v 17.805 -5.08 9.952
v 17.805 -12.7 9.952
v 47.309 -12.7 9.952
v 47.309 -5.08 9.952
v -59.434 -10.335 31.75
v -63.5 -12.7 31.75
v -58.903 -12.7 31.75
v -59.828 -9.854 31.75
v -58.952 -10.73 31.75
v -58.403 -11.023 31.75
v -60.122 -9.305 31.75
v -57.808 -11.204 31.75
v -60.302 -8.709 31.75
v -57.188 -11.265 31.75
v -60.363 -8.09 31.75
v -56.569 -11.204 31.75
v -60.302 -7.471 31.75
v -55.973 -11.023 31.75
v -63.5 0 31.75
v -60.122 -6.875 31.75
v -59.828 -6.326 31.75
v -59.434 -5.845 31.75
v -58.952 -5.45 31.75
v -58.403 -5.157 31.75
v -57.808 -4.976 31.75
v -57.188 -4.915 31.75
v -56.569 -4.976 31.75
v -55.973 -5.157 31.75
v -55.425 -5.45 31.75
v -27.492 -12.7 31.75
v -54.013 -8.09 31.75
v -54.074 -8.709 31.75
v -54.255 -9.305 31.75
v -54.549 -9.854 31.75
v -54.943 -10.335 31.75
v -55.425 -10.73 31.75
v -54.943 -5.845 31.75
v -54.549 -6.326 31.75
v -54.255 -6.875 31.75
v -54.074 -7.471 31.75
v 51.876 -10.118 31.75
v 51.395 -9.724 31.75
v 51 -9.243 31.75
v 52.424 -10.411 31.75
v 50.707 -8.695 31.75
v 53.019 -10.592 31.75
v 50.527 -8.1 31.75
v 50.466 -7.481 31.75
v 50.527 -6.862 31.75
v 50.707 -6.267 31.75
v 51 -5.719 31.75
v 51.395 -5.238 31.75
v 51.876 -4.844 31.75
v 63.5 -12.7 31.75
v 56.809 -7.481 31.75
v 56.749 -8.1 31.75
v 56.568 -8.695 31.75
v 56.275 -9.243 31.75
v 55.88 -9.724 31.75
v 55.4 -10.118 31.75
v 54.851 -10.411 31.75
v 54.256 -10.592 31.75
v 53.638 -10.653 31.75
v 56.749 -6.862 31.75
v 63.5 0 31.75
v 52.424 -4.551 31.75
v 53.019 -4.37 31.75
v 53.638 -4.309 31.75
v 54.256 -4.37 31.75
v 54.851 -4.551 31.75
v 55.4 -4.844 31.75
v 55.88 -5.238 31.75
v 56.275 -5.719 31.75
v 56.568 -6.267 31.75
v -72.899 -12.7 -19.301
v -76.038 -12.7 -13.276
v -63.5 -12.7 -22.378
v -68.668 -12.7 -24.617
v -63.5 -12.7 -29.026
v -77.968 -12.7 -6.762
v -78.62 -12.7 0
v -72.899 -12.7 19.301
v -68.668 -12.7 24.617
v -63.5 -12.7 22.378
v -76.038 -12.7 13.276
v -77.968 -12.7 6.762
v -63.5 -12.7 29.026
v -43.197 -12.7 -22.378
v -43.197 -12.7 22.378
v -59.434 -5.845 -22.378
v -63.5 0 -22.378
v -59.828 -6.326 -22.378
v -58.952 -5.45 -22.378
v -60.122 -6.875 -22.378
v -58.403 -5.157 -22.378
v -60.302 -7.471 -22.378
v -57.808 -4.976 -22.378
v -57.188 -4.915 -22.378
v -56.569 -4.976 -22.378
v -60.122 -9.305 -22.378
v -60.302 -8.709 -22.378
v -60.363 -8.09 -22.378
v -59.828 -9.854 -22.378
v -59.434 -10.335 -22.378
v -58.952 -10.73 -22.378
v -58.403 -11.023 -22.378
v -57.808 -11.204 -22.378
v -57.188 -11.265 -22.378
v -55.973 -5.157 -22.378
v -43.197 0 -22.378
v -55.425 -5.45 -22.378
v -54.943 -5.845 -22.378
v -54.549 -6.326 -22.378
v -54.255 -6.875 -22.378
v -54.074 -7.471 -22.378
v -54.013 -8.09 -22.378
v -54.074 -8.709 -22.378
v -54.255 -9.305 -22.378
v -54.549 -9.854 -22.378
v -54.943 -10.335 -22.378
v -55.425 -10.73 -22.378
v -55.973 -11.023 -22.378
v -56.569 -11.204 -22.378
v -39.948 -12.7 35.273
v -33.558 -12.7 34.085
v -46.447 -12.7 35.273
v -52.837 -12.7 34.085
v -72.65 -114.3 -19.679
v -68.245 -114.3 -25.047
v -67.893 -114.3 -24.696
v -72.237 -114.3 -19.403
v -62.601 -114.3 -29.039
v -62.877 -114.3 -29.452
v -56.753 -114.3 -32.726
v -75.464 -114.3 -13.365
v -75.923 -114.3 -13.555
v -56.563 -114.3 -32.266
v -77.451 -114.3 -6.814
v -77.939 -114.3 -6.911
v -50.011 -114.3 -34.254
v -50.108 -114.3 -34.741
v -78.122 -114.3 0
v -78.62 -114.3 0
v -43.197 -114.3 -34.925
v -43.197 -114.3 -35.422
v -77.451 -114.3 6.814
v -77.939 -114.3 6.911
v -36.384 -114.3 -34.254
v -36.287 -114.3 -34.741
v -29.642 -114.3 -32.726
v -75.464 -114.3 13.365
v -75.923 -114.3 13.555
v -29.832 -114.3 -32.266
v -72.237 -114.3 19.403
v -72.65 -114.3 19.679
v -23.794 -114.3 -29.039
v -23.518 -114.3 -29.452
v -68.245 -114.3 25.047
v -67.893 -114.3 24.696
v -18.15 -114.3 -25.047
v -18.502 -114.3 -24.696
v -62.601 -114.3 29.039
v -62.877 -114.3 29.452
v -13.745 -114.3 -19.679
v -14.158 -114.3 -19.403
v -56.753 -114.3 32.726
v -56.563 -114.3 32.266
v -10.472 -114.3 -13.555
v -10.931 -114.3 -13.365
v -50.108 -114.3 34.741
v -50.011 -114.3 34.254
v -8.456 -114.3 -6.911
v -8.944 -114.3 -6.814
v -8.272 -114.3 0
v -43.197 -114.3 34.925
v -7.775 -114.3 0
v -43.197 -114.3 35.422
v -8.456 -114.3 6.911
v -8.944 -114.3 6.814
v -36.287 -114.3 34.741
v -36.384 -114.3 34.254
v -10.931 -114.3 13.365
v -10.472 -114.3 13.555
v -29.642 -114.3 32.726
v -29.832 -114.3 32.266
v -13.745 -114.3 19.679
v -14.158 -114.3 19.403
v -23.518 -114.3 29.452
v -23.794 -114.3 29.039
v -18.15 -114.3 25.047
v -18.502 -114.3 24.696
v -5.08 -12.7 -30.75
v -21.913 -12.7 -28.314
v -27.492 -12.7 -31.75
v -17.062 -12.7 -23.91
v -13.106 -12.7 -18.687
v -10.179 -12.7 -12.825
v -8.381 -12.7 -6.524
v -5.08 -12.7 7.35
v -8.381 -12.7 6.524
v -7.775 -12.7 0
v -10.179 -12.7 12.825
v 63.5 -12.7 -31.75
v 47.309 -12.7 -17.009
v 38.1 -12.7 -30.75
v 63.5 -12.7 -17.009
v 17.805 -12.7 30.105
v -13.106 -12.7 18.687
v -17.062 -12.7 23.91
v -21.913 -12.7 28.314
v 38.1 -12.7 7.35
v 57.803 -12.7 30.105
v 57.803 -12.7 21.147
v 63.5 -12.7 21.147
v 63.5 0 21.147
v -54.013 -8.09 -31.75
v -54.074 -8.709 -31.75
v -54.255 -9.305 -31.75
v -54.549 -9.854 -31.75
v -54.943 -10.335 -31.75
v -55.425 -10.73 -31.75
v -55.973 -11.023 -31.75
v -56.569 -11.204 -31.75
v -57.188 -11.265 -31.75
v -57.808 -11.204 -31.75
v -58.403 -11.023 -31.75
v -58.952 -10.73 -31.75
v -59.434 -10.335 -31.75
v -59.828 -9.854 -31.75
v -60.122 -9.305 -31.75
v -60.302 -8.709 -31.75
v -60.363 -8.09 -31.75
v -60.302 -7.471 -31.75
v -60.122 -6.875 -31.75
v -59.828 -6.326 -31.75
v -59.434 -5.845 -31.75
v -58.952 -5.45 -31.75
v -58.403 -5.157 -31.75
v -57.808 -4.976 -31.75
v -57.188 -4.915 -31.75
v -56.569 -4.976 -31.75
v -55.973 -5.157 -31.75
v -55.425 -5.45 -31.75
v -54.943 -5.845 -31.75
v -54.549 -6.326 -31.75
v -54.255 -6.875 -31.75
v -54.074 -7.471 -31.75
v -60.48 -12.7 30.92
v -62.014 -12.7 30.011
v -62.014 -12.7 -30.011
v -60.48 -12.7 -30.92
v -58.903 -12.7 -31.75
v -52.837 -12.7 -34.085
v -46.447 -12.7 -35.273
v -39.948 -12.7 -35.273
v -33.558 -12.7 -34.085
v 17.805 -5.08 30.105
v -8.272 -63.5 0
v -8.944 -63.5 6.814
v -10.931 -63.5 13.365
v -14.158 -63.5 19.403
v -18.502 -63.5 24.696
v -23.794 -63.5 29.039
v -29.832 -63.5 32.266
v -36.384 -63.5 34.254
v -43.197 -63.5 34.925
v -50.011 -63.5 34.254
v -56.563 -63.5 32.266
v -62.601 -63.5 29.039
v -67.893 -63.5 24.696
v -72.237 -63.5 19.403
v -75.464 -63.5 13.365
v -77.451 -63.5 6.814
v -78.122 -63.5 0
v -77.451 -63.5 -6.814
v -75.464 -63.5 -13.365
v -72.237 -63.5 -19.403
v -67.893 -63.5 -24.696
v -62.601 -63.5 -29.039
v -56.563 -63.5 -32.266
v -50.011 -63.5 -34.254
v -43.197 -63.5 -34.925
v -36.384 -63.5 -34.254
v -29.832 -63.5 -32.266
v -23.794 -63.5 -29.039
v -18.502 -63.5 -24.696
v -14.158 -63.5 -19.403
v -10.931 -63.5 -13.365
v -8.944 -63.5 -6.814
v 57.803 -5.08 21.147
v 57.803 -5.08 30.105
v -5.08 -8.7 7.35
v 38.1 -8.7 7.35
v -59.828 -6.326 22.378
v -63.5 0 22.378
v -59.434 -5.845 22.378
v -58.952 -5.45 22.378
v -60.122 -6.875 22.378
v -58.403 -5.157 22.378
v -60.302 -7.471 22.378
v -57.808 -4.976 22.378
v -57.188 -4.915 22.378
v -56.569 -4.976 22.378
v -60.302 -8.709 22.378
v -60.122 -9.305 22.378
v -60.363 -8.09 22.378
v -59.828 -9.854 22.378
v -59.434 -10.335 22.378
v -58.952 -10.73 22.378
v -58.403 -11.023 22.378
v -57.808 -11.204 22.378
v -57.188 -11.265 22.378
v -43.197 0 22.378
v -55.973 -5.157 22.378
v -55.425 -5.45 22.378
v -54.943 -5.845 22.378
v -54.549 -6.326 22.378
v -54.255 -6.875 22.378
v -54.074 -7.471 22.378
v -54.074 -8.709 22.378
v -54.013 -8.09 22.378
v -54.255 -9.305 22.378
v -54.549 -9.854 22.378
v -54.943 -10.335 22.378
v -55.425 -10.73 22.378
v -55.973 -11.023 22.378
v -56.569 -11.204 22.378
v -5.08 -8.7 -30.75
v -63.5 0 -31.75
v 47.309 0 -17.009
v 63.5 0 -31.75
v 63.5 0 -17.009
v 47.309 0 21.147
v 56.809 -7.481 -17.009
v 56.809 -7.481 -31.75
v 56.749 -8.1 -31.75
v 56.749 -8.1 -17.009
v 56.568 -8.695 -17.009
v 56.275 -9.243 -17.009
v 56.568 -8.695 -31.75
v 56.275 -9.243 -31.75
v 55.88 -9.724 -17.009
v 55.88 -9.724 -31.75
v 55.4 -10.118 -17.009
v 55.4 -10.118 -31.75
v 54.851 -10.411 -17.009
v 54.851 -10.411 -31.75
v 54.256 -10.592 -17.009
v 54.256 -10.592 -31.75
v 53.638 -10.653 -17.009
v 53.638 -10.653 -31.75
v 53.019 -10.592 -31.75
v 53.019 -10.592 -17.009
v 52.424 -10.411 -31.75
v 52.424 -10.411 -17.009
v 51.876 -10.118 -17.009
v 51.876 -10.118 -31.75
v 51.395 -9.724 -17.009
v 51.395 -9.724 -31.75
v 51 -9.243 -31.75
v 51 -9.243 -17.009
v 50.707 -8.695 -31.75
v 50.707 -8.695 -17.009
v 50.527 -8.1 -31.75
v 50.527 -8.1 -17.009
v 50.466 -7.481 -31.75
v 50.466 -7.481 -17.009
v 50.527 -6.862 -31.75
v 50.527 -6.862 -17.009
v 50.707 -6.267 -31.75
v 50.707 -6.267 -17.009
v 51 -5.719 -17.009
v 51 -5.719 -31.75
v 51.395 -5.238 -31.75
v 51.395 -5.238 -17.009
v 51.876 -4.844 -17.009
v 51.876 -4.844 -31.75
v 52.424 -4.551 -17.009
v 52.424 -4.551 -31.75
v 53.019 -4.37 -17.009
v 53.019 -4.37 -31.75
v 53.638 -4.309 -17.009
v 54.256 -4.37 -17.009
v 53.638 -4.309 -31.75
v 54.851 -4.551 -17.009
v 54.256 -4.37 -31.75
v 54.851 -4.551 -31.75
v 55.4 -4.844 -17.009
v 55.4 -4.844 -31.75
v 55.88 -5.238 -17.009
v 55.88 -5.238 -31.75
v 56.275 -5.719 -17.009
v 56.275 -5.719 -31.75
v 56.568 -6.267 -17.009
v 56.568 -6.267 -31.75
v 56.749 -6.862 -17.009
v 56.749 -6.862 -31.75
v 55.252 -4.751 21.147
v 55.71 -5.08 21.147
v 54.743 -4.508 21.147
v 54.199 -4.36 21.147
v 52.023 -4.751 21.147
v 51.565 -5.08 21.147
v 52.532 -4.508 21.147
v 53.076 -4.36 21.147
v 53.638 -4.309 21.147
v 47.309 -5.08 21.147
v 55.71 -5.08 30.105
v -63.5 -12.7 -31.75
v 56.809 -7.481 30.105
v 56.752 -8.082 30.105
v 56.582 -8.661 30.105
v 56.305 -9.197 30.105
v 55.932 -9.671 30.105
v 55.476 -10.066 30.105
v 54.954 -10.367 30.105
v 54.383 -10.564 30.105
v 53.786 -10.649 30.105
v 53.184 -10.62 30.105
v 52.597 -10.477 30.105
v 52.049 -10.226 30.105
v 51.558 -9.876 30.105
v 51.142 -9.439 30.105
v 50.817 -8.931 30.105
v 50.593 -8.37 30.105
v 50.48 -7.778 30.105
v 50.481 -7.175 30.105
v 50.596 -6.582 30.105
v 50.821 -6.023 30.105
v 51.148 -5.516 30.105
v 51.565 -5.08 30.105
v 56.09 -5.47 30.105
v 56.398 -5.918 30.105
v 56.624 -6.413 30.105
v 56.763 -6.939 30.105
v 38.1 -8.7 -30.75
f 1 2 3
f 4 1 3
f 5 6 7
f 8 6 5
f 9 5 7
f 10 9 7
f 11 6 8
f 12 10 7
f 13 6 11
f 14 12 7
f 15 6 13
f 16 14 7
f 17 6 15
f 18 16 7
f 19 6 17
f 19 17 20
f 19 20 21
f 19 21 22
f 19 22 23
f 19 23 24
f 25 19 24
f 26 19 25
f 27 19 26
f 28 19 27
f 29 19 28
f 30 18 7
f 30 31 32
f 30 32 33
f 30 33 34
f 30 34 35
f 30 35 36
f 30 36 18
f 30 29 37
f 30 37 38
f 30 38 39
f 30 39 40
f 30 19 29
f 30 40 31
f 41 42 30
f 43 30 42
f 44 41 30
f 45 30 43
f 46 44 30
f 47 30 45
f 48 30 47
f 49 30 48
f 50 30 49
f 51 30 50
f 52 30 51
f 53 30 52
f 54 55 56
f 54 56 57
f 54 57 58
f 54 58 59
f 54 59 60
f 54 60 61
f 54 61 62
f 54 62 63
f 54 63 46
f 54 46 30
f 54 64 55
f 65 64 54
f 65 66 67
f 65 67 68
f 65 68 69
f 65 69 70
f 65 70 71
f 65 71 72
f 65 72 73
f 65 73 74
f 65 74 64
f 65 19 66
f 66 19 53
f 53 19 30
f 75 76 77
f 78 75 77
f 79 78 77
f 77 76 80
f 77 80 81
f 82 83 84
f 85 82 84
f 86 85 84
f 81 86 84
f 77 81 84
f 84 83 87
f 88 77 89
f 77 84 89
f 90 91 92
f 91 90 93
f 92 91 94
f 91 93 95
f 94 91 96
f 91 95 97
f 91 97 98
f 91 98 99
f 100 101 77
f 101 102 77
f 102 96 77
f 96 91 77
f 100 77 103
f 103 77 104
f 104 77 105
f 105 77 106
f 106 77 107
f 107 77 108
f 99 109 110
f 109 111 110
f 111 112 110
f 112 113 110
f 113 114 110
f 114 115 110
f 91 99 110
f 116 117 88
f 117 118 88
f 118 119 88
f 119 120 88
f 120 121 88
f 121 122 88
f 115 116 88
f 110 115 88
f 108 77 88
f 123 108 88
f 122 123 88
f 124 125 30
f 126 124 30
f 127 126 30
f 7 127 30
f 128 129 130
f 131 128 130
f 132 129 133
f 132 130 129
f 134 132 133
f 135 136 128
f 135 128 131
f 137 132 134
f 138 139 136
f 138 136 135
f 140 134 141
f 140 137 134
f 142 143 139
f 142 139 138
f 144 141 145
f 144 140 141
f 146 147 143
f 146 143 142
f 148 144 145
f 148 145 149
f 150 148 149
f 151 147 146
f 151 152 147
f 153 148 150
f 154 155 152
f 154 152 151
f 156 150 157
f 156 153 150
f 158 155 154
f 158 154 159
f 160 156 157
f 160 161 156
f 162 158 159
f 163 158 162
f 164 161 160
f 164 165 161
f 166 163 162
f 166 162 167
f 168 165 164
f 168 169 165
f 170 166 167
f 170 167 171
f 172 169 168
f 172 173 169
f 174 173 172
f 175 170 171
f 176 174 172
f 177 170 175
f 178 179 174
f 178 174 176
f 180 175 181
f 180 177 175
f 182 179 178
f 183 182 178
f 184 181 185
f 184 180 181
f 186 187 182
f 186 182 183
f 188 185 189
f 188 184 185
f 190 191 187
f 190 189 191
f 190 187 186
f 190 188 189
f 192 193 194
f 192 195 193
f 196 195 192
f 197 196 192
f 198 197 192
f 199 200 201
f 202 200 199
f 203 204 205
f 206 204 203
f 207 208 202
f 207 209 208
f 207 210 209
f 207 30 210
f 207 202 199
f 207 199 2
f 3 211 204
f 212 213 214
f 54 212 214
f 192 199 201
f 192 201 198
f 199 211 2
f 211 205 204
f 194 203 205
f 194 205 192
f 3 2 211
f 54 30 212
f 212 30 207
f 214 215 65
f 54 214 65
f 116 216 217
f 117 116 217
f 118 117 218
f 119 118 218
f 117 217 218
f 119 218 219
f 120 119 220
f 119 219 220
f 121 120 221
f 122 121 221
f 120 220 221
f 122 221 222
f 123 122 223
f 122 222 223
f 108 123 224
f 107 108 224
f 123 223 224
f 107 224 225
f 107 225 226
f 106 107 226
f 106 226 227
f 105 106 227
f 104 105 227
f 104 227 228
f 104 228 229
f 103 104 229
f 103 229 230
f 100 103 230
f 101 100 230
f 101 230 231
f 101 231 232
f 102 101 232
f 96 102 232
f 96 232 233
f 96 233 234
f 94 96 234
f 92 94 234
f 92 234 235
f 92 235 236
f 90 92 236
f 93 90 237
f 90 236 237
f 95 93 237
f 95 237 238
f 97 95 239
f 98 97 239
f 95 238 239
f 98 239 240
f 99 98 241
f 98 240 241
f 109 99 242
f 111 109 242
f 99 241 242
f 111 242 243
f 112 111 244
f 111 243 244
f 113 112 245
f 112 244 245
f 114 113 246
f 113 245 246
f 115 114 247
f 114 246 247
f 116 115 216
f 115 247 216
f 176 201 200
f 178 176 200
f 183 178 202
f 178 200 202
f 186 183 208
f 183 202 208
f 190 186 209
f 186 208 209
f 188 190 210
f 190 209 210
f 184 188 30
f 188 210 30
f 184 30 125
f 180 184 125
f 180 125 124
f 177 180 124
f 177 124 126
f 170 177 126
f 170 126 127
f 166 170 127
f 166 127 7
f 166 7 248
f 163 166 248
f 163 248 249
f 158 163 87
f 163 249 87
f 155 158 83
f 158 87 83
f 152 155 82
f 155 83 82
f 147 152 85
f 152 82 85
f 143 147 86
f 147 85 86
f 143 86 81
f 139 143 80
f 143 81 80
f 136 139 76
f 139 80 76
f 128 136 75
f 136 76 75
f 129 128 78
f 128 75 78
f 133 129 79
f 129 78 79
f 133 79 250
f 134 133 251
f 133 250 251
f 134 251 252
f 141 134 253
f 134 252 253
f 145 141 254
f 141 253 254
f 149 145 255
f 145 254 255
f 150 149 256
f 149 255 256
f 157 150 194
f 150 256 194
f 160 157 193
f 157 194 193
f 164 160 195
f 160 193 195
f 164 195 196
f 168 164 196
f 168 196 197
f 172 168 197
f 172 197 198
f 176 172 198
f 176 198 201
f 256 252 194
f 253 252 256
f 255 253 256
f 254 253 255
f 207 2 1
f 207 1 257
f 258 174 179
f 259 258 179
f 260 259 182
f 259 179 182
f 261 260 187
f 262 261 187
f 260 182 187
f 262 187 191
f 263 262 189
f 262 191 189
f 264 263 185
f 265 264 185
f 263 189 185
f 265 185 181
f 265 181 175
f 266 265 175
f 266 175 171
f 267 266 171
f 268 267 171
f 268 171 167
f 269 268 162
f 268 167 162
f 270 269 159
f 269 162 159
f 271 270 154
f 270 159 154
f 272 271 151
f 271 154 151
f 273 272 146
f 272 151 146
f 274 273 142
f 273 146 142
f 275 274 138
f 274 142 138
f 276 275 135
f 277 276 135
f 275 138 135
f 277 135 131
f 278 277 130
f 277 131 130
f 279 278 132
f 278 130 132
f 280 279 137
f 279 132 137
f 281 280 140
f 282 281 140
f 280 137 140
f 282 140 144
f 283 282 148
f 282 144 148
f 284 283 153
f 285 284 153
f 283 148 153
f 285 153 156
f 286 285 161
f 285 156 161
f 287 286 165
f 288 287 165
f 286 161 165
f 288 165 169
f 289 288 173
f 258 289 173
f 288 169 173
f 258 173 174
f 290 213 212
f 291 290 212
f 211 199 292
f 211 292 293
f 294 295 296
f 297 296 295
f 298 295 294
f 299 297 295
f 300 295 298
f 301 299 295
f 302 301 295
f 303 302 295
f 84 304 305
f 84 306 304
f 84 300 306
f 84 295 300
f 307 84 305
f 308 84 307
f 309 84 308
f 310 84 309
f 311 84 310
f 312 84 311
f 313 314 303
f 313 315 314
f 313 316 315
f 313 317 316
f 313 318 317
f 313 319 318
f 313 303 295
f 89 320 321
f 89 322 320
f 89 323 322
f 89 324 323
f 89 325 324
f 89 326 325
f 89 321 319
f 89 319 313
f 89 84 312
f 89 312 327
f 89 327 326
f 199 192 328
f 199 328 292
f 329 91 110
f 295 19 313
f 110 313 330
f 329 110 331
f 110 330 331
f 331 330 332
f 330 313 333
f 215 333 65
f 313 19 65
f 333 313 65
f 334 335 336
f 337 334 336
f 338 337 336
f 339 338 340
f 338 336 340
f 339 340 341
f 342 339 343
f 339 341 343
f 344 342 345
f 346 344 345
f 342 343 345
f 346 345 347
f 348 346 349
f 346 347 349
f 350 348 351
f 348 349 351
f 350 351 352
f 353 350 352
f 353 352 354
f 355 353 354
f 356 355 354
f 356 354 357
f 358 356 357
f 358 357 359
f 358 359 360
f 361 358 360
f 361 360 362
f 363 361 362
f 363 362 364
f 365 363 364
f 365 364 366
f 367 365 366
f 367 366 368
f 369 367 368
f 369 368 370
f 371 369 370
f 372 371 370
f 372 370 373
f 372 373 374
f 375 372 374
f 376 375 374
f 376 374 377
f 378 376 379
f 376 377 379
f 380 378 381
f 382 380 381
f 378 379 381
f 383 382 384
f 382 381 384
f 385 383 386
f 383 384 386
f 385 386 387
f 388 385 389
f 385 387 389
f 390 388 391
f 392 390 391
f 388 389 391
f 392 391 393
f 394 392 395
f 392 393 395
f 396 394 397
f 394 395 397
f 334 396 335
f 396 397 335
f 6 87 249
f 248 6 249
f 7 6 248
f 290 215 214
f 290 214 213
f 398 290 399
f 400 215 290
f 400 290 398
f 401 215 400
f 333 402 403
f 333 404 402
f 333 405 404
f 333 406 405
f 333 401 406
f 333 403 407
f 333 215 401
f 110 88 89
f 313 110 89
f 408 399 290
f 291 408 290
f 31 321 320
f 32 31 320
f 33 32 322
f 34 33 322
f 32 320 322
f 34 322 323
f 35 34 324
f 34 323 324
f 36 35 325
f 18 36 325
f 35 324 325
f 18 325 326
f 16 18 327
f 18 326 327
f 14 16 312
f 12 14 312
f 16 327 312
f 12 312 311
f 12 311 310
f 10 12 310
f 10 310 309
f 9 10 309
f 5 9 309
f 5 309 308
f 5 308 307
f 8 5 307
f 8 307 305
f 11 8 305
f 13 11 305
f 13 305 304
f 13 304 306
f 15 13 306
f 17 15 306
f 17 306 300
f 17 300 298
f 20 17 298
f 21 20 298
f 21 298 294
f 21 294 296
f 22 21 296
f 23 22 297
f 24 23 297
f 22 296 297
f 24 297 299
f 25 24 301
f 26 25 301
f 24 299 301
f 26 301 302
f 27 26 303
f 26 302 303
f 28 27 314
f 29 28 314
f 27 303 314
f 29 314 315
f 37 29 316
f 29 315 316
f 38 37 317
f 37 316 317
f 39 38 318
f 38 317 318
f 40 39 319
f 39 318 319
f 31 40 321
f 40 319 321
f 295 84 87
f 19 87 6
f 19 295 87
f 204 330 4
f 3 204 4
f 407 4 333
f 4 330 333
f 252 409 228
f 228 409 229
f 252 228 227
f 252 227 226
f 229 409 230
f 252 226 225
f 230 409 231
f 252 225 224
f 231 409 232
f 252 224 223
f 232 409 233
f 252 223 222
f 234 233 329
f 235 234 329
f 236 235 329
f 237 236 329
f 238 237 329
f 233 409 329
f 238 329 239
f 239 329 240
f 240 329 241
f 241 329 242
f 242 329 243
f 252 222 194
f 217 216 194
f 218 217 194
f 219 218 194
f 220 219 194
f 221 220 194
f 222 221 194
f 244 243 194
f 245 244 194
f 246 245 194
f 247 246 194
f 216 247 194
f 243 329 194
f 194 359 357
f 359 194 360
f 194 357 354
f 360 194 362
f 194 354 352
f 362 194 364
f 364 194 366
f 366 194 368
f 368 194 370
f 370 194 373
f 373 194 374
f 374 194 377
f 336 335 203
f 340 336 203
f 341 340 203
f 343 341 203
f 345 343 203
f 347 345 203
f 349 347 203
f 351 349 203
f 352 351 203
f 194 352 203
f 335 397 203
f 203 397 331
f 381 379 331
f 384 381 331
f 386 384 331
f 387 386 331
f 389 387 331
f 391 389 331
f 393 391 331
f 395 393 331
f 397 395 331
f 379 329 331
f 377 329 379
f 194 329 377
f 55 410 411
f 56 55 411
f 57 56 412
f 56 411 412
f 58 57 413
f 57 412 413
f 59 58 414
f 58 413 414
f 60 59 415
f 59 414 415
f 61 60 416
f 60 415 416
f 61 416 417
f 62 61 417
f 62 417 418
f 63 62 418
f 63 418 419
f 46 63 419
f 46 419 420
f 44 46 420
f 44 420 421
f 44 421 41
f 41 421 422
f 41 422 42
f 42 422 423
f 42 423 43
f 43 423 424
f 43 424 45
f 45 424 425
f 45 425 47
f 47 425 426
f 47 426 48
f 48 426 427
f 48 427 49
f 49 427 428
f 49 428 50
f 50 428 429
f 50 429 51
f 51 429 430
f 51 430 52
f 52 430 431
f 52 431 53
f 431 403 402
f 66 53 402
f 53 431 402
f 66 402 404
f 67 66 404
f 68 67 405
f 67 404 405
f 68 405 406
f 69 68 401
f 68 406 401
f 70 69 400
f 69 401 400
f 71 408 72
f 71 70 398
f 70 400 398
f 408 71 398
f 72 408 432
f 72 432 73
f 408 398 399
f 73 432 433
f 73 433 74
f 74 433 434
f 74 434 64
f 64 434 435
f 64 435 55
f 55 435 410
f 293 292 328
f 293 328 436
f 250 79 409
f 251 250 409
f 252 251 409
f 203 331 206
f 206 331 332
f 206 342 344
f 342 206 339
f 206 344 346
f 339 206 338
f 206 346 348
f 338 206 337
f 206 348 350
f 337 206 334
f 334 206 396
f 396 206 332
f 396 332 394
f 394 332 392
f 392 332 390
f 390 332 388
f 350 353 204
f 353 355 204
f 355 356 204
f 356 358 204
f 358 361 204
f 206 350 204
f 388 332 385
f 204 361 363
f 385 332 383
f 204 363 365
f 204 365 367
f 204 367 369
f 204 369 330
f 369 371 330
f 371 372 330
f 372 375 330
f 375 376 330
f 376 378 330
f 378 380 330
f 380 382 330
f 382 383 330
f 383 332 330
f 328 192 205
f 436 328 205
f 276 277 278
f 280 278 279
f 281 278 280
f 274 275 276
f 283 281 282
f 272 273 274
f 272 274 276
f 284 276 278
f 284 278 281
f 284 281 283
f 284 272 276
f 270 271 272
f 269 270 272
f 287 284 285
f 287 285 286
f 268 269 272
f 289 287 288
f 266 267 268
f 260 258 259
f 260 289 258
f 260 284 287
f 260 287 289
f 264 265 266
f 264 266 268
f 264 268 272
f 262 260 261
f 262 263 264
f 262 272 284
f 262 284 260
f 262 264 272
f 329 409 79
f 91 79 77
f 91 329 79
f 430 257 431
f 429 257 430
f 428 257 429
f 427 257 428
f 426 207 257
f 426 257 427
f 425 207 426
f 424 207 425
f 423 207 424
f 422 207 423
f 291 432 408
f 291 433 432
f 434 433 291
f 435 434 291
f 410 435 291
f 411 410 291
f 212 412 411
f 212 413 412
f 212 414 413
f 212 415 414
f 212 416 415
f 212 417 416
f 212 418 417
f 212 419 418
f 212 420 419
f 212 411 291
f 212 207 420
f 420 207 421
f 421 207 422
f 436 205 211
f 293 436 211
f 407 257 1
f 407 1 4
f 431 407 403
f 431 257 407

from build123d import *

# Parameters (mm, degrees)
F0_W      = 127
F0_H      = 63.5
F1_DEPTH  = 12.7
F2_W      = 43.18
F2_H      = 38.1
F3_DEPTH  = 4
F4_W      = 39.997619
F4_H      = 20.153031
F5_DEPTH  = 7.62
F6_R      = 3.171763
F7_DEPTH  = 63.501
F8_R      = 3.175
F9_DEPTH  = 63.501
F10_W     = 32.382142
F10_H     = 38.156119
F11_DEPTH = 12.701
F12_W     = 40.605094
F12_H     = 44.755168
F13_DEPTH = 12.701
F14_R     = 35.422098
F15_DEPTH = 101.6
F16_R     = 34.925
F17_DEPTH = 50.8


with BuildPart() as f1:
    # F0 (on Front) → F1 (new body)
    with BuildSketch(Plane.XZ):
        Rectangle(F0_W, F0_H)
    extrude(amount=F1_DEPTH)

    # F2 (on face) → F3 (cut)
    with BuildSketch(Plane.XZ.offset(12.7)):
        with Locations((16.51, -11.7)):
            Rectangle(F2_W, F2_H)
    extrude(amount=-F3_DEPTH, mode=Mode.SUBTRACT)

    # F4 (on face) → F5 (cut)
    with BuildSketch(Plane.XZ.offset(12.7)):
        with Locations((37.80372, 20.028367)):
            Rectangle(F4_W, F4_H)
    extrude(amount=-F5_DEPTH, mode=Mode.SUBTRACT)

    # F6 (on face) → F7 (cut, through all)
    with BuildSketch(Plane(origin=(0, 0, -31.75), x_dir=(1, 0, 0), z_dir=(0, 0, -1))):
        with Locations((53.637695, 7.481154)):
            Circle(F6_R)
    extrude(amount=-F7_DEPTH, mode=Mode.SUBTRACT)

    # F8 (on face) → F9 (cut, through all)
    with BuildSketch(Plane(origin=(0, 0, -31.75), x_dir=(1, 0, 0), z_dir=(0, 0, -1))):
        with Locations((-57.188451, 8.090043)):
            Circle(F8_R)
    extrude(amount=-F9_DEPTH, mode=Mode.SUBTRACT)

    # F10 (on face) → F11 (cut, through all)
    with BuildSketch(Plane(origin=(0, 0, 0), x_dir=(-1, 0, 0), z_dir=(0, 1, 0))):
        with Locations((-63.5, 2.069221)):
            Rectangle(F10_W, F10_H)
    extrude(amount=-F11_DEPTH, mode=Mode.SUBTRACT)

    # F12 (on face) → F13 (cut, through all)
    with BuildSketch(Plane.XZ.offset(12.7)):
        with Locations((-63.5, 0)):
            Rectangle(F12_W, F12_H)
    extrude(amount=-F13_DEPTH, mode=Mode.SUBTRACT)

    # F14 (on face) → F15 (join)
    with BuildSketch(Plane.XZ.offset(12.7)):
        with Locations((-43.197453, 0)):
            Circle(F14_R)
    extrude(amount=F15_DEPTH)

    # F16 (on face) → F17 (cut)
    with BuildSketch(Plane.XZ.offset(114.3)):
        with Locations((-43.197453, 0)):
            Circle(F16_R)
    extrude(amount=-F17_DEPTH, mode=Mode.SUBTRACT)


solid = f1.part
